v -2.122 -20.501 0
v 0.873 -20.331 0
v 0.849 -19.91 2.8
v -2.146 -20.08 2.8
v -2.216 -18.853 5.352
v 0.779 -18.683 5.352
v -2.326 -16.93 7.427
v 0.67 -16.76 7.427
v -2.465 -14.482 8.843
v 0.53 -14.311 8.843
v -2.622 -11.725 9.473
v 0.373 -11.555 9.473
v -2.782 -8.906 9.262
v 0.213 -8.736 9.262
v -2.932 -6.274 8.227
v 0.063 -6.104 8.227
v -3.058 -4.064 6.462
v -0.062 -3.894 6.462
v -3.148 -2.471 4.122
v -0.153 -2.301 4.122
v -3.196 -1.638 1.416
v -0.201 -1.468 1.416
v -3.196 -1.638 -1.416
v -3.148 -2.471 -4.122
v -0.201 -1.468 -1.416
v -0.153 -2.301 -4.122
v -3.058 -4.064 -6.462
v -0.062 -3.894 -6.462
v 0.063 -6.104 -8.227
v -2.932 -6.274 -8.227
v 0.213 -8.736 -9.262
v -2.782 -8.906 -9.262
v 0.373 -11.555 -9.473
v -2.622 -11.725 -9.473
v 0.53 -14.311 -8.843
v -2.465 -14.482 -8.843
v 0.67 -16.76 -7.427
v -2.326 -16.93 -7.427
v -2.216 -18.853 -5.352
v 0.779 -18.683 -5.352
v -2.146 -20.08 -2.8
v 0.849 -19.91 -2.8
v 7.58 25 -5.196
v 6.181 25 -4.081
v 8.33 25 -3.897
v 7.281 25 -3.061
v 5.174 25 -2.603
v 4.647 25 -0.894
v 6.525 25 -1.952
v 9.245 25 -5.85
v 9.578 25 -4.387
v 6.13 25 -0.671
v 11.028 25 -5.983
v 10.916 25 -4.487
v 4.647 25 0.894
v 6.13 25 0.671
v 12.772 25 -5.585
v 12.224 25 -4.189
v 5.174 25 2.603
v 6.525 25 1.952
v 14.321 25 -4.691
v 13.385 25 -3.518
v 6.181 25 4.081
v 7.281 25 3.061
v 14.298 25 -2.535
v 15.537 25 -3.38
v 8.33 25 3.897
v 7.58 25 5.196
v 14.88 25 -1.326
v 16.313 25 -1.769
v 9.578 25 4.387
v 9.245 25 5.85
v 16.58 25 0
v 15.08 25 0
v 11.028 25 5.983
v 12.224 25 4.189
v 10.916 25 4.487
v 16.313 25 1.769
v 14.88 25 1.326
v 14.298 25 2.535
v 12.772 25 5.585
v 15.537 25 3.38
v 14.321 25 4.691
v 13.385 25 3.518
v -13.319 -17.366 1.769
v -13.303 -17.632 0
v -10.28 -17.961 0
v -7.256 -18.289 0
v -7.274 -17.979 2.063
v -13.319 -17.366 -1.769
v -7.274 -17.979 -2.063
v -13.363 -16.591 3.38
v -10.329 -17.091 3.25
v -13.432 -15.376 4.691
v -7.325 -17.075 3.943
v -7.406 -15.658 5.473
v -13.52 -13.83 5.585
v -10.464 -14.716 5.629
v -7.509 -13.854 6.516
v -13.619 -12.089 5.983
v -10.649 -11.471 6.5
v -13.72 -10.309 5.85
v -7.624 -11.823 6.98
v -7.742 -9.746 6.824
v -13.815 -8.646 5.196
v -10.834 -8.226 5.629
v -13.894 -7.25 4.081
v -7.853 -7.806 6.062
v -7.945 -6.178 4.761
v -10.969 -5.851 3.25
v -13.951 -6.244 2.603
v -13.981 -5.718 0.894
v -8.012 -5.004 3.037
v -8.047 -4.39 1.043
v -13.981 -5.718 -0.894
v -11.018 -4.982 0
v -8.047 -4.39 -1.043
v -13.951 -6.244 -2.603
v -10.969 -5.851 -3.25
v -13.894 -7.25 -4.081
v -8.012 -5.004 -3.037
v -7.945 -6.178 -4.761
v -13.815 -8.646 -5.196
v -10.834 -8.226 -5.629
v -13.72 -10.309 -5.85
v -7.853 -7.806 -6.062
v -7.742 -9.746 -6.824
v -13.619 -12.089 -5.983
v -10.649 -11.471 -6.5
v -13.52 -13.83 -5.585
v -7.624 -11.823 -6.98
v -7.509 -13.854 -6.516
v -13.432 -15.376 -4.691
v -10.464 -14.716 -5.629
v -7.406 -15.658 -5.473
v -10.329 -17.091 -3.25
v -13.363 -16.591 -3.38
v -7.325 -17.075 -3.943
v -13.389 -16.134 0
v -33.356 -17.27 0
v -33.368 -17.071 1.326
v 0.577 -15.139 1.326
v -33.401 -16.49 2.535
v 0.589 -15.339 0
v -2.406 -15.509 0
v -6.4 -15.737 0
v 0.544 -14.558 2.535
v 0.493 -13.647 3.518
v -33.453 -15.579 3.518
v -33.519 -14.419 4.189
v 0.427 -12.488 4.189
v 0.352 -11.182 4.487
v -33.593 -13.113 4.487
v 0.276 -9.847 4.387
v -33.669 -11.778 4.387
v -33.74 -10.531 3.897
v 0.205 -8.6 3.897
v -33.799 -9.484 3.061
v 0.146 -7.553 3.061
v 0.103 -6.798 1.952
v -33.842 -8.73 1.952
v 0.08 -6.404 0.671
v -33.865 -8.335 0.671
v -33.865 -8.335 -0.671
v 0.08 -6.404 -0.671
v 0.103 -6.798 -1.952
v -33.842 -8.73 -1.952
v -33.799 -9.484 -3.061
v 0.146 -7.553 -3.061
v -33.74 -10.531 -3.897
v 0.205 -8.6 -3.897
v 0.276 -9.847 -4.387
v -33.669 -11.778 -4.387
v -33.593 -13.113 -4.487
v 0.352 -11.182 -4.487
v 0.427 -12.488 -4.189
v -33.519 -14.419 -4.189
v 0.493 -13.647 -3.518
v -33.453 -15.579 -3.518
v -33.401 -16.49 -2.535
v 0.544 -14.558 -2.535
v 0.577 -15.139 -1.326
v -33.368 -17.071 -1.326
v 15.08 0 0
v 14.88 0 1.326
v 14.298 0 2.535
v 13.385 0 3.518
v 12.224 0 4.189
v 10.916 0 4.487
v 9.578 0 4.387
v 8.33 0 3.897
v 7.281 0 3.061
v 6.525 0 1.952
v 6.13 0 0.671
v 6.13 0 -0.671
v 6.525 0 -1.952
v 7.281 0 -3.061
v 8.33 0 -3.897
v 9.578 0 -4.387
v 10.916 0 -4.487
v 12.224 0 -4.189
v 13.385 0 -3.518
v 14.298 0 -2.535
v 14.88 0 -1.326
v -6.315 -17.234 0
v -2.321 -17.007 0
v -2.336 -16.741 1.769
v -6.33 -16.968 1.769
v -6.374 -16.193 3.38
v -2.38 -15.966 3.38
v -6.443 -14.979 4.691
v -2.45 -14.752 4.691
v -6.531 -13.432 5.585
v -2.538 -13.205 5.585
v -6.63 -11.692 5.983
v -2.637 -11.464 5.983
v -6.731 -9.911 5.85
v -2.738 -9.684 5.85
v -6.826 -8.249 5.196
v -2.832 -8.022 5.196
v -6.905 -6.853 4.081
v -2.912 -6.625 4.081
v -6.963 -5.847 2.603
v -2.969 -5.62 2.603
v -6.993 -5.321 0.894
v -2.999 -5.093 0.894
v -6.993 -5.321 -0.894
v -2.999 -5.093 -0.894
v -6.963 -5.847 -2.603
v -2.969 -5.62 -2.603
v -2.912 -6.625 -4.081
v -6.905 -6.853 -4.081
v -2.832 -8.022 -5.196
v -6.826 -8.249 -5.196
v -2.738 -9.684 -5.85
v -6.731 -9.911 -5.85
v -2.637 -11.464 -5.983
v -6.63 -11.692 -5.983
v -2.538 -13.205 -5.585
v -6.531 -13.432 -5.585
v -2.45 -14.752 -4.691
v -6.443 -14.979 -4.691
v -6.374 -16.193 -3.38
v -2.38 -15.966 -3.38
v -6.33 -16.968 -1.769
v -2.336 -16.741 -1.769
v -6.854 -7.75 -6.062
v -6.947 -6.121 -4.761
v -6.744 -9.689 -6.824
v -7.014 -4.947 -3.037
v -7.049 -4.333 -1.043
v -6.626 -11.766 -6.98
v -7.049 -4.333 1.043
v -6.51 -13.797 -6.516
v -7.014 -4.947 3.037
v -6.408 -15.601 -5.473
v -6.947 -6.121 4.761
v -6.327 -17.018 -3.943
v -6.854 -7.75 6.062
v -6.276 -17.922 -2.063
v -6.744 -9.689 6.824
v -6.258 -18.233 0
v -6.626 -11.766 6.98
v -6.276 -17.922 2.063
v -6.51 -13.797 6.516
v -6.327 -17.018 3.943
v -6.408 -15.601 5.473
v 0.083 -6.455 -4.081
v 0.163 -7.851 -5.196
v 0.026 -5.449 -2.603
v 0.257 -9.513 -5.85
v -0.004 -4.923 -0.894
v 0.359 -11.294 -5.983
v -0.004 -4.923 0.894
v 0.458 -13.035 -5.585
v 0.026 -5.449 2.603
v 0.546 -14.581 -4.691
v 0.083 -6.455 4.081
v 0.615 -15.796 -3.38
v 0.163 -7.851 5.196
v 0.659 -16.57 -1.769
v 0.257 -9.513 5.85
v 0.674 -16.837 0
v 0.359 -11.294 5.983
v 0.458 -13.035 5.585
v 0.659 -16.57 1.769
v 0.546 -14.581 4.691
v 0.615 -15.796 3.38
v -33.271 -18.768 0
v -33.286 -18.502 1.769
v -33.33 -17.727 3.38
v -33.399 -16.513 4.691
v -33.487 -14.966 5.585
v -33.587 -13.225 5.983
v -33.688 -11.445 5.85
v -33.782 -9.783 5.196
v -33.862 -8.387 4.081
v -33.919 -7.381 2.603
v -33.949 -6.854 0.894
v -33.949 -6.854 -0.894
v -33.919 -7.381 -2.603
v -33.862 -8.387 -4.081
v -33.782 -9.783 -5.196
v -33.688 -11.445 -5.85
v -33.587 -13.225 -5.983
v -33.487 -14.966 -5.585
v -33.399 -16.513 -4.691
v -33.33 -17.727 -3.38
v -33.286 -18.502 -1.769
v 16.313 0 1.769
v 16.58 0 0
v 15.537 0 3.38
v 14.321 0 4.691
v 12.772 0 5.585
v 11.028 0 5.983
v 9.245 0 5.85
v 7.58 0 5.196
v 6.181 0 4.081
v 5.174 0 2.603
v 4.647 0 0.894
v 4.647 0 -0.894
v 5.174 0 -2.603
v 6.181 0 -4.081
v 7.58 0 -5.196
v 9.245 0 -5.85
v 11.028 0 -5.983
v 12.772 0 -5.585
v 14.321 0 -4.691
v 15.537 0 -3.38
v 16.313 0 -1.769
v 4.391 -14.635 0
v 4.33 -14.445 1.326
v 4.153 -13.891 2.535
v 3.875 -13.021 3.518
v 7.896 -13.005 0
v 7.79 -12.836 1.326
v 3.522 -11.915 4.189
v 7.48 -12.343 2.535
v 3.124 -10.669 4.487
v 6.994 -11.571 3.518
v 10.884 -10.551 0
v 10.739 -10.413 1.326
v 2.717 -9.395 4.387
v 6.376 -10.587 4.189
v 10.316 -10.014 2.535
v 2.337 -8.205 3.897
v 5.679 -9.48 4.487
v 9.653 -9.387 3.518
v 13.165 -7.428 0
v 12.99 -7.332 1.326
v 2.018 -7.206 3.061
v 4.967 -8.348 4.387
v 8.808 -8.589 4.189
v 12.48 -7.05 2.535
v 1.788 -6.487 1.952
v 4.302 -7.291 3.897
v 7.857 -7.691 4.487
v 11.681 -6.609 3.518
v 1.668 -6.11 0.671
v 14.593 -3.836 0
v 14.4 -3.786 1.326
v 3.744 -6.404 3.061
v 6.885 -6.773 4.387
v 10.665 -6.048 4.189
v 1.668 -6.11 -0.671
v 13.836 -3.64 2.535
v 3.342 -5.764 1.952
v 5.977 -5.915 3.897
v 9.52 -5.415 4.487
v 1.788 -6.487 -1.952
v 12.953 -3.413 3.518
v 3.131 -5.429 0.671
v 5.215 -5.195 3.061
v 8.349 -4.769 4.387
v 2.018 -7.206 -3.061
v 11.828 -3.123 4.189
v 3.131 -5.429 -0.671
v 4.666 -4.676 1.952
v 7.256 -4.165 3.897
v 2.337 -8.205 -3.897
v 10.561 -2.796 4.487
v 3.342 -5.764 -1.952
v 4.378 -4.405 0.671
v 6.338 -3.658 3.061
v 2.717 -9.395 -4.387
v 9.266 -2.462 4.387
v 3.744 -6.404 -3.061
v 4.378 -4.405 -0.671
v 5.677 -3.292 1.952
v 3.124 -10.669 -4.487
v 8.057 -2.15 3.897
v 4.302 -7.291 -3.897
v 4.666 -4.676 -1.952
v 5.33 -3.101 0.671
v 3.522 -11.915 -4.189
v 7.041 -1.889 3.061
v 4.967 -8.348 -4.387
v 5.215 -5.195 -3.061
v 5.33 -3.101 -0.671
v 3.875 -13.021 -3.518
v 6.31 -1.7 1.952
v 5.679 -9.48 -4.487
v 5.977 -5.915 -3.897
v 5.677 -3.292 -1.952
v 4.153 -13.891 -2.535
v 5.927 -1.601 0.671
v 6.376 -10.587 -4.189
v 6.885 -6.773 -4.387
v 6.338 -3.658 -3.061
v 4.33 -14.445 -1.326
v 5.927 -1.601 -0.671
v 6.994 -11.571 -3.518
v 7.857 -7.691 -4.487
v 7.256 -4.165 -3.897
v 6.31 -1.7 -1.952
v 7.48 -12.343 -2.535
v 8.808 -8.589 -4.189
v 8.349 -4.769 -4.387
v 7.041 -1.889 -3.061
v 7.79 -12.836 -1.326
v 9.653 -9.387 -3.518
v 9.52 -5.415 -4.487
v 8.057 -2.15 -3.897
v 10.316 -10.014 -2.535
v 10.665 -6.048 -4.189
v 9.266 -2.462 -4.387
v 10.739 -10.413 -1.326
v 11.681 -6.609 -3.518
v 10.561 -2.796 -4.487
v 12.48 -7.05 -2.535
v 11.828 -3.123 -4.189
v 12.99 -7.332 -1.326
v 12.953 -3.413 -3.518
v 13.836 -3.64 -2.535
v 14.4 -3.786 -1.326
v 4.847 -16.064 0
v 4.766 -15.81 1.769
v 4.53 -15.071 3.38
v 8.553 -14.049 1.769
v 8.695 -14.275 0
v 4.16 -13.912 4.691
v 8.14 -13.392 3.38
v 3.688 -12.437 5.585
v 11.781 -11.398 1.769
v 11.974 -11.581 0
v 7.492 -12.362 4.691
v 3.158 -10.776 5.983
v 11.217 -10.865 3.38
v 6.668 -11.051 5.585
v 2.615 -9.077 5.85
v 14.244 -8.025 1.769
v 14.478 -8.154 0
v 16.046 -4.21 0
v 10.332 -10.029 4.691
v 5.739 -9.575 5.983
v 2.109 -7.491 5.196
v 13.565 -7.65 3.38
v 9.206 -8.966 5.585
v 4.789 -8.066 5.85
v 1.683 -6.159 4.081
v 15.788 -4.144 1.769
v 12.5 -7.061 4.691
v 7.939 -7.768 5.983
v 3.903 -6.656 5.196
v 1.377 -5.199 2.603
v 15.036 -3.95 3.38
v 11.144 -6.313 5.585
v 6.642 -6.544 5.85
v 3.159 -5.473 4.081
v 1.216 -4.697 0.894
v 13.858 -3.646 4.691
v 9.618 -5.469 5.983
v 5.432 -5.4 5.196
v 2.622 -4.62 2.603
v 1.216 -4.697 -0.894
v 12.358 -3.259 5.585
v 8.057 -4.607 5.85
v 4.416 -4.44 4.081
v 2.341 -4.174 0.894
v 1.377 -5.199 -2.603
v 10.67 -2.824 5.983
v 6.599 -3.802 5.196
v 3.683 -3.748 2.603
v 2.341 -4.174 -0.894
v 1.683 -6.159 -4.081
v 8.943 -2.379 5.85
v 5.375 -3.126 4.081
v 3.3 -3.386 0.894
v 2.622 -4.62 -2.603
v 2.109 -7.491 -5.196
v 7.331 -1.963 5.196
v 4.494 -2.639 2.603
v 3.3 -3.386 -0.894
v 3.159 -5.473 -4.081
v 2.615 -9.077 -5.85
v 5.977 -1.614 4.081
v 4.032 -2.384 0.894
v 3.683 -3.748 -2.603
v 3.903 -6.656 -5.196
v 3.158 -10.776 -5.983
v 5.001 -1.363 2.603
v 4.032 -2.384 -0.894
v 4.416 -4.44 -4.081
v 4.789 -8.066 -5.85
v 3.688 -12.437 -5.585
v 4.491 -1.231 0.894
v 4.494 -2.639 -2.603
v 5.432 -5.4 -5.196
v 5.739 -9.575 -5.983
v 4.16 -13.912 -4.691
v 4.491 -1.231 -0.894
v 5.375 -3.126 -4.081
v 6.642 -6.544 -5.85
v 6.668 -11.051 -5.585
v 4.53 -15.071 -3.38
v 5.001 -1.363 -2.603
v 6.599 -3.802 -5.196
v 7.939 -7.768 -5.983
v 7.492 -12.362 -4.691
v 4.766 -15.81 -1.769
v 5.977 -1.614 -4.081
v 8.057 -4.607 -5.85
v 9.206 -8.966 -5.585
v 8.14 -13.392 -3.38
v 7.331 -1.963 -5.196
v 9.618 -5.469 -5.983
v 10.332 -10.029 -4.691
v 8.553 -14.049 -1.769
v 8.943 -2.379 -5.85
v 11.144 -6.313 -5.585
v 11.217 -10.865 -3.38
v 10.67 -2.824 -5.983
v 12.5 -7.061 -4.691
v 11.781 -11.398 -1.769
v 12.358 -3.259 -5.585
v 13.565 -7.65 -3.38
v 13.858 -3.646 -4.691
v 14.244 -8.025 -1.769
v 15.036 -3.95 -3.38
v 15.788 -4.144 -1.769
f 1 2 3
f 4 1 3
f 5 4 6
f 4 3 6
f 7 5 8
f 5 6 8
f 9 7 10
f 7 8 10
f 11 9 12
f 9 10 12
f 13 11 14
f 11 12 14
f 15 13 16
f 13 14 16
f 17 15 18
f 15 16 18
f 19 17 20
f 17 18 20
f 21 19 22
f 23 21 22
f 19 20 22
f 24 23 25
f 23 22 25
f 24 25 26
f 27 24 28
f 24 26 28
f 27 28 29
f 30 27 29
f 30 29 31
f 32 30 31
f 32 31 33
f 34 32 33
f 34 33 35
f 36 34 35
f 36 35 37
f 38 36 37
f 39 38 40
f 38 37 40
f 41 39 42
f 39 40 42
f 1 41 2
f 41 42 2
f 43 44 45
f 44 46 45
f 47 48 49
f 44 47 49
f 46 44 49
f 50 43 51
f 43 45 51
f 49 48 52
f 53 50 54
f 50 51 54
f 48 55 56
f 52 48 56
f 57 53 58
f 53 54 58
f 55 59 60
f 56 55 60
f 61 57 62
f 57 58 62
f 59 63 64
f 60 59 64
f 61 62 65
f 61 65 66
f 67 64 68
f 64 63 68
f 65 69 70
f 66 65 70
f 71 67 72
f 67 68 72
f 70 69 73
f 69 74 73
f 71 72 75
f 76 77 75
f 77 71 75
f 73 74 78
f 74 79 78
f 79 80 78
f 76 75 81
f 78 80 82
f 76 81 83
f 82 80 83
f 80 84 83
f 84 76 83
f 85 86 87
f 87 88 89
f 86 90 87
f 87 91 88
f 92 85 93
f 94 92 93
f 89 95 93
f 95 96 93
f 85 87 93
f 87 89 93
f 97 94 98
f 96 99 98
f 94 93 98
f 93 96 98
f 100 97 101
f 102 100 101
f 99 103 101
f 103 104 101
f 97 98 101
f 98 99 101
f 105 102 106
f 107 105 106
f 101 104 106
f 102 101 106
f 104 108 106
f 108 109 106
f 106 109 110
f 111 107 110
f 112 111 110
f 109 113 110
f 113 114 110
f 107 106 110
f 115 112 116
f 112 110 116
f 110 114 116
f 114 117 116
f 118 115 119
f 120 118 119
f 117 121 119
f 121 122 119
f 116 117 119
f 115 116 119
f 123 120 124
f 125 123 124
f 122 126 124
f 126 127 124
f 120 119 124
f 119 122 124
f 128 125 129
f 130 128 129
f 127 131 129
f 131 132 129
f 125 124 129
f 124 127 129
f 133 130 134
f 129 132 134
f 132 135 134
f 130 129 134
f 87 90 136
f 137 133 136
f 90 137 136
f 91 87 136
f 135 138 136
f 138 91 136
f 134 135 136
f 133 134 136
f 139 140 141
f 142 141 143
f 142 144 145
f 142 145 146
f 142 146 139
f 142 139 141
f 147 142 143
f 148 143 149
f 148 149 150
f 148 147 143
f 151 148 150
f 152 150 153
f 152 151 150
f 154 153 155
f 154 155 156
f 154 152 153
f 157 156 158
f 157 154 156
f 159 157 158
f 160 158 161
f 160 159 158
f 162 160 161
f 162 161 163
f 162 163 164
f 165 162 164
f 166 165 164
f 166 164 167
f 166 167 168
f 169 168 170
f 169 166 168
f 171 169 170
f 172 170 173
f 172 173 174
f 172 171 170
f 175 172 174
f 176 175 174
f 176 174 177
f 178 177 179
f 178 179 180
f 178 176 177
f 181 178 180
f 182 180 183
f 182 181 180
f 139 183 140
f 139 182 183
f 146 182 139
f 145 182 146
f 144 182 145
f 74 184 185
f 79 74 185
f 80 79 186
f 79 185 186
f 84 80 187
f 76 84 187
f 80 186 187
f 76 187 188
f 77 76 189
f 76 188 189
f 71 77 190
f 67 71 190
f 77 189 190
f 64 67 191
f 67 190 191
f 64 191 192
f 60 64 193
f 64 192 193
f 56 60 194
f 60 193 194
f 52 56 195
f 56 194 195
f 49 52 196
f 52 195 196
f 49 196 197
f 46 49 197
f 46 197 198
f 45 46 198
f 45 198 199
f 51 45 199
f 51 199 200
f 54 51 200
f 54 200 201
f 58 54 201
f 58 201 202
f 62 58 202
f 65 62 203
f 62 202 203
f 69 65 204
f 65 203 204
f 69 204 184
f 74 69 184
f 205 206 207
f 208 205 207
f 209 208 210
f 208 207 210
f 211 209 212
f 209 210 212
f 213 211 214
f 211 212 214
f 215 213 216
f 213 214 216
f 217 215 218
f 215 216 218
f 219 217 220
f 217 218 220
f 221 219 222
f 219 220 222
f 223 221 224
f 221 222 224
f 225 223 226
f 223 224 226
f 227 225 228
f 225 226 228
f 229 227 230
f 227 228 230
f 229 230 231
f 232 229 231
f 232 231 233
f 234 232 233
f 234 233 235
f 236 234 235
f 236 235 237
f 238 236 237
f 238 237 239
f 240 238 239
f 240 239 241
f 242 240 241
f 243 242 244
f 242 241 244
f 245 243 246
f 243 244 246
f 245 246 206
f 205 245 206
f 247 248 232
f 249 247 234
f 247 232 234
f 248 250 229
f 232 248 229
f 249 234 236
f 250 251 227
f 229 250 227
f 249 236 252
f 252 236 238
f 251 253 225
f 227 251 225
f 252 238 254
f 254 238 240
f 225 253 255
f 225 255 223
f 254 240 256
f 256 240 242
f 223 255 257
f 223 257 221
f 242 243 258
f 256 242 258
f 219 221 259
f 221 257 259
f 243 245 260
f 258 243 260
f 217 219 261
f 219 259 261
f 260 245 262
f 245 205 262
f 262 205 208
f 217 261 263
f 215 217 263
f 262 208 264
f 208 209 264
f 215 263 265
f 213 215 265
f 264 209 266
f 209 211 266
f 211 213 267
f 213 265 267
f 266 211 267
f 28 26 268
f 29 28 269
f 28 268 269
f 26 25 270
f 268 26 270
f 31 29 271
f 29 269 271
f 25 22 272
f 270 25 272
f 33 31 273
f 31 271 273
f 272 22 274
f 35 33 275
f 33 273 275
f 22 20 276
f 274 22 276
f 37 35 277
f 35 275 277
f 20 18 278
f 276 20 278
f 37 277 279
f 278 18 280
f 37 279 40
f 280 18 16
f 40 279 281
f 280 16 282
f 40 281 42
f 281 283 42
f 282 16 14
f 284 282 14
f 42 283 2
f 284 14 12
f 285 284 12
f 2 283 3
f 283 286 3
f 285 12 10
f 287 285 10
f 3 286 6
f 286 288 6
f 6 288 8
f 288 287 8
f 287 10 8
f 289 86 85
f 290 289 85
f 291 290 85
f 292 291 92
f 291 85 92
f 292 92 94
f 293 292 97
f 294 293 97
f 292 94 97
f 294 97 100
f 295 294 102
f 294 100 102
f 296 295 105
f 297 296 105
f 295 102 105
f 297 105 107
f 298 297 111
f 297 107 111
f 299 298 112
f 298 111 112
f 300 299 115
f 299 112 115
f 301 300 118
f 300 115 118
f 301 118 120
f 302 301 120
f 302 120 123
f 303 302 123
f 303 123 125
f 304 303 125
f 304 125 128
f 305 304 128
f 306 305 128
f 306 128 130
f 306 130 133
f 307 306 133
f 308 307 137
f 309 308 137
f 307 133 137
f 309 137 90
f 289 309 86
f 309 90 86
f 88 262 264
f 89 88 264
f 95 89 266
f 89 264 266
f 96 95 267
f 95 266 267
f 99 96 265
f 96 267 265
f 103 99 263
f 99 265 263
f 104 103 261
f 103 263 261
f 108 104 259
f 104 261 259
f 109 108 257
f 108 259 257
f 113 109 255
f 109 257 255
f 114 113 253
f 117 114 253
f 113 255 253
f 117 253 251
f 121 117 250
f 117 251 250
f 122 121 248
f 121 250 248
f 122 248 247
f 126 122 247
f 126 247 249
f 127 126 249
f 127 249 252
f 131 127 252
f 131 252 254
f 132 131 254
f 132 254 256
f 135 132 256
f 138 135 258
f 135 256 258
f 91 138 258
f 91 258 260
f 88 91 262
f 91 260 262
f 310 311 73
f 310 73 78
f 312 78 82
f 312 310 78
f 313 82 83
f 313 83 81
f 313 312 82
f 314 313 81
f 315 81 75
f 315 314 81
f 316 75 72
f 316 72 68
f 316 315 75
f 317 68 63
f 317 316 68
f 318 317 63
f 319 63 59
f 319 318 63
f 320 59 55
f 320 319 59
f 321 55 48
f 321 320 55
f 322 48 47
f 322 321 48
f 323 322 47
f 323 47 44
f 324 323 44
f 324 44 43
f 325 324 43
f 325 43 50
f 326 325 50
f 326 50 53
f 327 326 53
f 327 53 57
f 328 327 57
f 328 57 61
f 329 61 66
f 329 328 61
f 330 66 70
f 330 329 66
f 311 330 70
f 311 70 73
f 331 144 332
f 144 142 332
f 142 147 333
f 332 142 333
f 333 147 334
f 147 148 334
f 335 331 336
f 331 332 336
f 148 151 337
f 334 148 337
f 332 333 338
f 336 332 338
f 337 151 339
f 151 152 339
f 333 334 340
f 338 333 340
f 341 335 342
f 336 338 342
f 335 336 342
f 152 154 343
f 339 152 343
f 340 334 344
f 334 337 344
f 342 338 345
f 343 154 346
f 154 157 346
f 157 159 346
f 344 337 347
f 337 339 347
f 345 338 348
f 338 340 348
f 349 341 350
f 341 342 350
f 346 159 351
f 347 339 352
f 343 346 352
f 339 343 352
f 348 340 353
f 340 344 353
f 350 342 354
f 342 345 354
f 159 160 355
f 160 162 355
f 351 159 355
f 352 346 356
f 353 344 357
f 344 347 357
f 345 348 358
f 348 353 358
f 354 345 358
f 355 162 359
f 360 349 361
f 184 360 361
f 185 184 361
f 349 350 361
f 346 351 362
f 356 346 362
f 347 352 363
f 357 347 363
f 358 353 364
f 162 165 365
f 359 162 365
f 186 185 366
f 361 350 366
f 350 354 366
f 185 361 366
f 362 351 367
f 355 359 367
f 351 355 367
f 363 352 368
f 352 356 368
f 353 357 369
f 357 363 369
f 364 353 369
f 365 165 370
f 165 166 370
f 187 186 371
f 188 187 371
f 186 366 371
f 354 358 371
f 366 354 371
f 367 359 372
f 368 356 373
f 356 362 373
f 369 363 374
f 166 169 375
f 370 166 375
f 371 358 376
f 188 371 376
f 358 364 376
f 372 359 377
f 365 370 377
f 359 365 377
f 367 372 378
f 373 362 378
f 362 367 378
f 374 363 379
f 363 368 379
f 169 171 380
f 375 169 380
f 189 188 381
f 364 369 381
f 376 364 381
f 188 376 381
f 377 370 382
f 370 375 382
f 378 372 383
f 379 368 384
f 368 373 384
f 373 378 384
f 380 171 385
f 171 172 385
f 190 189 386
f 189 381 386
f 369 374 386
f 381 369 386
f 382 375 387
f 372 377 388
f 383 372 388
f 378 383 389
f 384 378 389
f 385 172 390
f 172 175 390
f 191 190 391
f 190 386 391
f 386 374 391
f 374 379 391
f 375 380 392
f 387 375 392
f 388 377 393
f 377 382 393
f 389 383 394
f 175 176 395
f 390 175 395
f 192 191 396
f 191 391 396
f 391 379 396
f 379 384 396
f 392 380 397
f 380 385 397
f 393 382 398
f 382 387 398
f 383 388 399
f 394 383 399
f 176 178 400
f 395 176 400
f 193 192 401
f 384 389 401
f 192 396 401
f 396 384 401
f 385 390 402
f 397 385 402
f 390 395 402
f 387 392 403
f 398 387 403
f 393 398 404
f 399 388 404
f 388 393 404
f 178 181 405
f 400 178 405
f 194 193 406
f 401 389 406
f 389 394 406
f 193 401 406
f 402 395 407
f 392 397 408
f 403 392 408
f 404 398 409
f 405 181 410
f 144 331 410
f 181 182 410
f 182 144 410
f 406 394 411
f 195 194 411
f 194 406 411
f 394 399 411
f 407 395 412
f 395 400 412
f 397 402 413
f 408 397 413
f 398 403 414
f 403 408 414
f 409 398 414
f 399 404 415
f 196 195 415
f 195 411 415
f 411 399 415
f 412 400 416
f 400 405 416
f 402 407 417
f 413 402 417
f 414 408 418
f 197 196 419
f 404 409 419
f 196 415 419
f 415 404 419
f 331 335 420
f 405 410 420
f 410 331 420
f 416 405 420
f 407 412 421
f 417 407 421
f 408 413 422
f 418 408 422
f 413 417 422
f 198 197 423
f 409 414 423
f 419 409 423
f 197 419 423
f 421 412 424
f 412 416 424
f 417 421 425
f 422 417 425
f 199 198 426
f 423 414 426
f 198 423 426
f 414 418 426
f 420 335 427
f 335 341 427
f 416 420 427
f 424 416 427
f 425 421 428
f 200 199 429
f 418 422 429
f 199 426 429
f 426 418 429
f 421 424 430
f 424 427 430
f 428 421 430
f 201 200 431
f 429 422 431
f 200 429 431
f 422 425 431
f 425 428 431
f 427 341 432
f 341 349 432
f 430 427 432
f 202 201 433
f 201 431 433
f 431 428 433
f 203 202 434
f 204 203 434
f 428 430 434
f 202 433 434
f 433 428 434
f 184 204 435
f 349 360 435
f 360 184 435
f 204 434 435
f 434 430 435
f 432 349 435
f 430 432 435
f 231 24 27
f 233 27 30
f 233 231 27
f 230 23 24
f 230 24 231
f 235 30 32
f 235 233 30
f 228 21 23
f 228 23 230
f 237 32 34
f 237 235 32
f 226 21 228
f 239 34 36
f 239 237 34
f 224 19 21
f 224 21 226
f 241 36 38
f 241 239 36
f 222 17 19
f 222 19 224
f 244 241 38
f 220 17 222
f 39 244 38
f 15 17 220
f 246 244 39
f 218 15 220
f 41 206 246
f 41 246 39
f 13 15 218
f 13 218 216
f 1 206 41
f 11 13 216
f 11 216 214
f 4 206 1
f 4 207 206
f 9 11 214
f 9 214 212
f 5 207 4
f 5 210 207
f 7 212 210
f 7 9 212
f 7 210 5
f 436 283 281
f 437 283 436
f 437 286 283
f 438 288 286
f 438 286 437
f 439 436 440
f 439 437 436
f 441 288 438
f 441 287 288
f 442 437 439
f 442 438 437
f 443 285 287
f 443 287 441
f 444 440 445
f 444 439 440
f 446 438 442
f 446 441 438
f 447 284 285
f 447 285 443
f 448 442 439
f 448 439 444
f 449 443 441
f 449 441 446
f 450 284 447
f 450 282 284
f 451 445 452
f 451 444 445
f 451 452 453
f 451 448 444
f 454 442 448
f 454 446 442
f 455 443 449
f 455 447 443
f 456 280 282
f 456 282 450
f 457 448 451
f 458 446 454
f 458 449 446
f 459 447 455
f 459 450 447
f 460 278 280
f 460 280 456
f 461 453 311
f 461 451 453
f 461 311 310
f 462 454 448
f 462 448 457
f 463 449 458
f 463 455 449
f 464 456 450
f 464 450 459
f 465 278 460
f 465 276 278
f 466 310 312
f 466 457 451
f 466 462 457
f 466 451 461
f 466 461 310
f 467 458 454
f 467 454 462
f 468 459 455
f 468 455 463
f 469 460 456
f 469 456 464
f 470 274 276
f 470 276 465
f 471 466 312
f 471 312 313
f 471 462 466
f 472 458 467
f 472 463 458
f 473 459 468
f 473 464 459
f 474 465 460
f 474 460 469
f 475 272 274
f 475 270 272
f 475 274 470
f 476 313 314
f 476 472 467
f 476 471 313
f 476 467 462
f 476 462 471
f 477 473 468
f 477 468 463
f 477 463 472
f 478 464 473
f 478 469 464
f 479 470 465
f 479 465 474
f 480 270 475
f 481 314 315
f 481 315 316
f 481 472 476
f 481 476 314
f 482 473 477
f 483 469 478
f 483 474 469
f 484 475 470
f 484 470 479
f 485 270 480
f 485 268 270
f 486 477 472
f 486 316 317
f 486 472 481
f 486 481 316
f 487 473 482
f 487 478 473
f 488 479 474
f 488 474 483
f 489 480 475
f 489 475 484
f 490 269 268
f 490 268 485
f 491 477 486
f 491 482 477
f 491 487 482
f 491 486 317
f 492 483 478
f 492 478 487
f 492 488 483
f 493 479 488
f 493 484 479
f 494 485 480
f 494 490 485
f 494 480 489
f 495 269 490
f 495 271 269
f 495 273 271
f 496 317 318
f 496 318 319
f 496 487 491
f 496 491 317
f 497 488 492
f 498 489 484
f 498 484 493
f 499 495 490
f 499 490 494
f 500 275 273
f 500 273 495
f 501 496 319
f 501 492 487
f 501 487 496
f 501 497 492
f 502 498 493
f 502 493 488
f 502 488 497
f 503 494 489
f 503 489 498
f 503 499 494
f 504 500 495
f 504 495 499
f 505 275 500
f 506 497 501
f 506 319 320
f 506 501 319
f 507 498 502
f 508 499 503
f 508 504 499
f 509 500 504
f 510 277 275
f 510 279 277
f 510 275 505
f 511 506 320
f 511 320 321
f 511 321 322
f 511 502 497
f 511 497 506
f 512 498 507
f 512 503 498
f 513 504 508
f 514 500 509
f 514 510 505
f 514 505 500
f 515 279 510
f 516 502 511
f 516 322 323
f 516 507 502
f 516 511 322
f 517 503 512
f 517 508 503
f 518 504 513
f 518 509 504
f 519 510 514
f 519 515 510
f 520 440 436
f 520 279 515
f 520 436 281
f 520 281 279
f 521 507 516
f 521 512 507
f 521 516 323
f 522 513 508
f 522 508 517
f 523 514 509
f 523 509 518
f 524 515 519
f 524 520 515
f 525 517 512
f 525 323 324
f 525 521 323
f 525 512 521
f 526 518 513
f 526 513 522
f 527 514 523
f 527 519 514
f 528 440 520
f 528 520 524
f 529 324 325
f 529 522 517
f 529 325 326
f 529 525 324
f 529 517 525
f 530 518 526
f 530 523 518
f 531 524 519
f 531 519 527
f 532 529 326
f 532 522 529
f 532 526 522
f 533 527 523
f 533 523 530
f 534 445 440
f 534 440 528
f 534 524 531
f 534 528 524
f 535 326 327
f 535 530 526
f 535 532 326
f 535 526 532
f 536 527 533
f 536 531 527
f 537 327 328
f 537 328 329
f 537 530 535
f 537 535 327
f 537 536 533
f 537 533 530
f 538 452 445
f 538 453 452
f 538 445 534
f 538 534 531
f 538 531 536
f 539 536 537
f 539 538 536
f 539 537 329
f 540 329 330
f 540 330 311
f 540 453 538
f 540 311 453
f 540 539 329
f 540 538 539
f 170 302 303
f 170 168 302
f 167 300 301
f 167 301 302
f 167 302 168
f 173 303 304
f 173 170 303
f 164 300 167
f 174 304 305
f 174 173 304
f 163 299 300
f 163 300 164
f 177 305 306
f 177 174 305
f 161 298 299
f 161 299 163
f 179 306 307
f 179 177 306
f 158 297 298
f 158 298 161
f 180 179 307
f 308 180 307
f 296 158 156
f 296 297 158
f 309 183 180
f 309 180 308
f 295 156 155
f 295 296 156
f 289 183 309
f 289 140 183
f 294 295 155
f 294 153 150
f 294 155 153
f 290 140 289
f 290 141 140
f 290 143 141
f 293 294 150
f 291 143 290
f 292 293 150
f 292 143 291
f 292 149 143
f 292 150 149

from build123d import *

# Parameters (mm, degrees)
F1_R        = 6
F1_R_2      = 4.5
F2_DEPTH    = 25
F2_FACE_R   = 6
F2_FACE_R_2 = 4.5
F4_R        = 9.5
F4_R_2      = 6
F4_R_3      = 4.5
F5_DEPTH    = 3
F6_R        = 6
F6_R_2      = 4.5
F7_DEPTH    = 4
F8_R        = 7
F8_R_2      = 6
F8_R_3      = 4.5
F9_DEPTH    = 7
F10_SIZE2   = 6
F10_SIZE    = 1
F11_R       = 6
F11_R_2     = 4.5
F12_DEPTH   = 20


with BuildPart() as f2:
    # F1 (on Front) → F2 (new body)
    with BuildSketch(Plane.XZ):
        with Locations((10.5797667056, 0)):
            Circle(F1_R)
        with Locations((10.5797667056, 0)):
            Circle(F1_R_2, mode=Mode.SUBTRACT)
    extrude(amount=-F2_DEPTH)

    # F3: sweep along a path in F0
    with BuildLine(Plane.XY) as f3_path:
        ThreePointArc((0, -4.9919255074), (3.3505289628, -3.4336417355), (4.7159582272, 0))
    # F2_face (on face) → F3 (sweep)
    with BuildSketch(Plane(origin=(10.5797667056, 0, 0), x_dir=(1, 0, 0), z_dir=(0, -1, 0))):
        Circle(F2_FACE_R)
        Circle(F2_FACE_R_2, mode=Mode.SUBTRACT)
    sweep(path=f3_path.line)

    # F4 (on face) → F5 (join)
    with BuildSketch(Plane(origin=(-0.2831251163, -0.0161098878, 0), x_dir=(0.0568083546, -0.9983851015, 0), z_dir=(-0.9983851015, -0.0568083546, 0))):
        with Locations((10.8476725327, 0)):
            Circle(F4_R)
        with Locations((10.8476725327, 0)):
            Circle(F4_R_2, mode=Mode.SUBTRACT)
        with Locations((10.8476725327, 0)):
            Circle(F4_R_2)
        with Locations((10.8476725327, 0)):
            Circle(F4_R_3, mode=Mode.SUBTRACT)
    extrude(amount=F5_DEPTH)

    # F6 (on face) → F7 (join)
    with BuildSketch(Plane(origin=(-3.2782804207, -0.1865349515, 0), x_dir=(0.0568083546, -0.9983851015, 0), z_dir=(-0.9983851015, -0.0568083546, 0))):
        with Locations((10.8476725327, 0)):
            Circle(F6_R)
        with Locations((10.8476725327, 0)):
            Circle(F6_R_2, mode=Mode.SUBTRACT)
    extrude(amount=F7_DEPTH)

    # F8 (on face) → F9 (join)
    with BuildSketch(Plane(origin=(-7.2718208266, -0.4137683698, 0), x_dir=(0.0568083546, -0.9983851015, 0), z_dir=(-0.9983851015, -0.0568083546, 0))):
        with Locations((10.8476725327, 0)):
            Circle(F8_R)
        with Locations((10.8476725327, 0)):
            Circle(F8_R_2, mode=Mode.SUBTRACT)
        with Locations((10.8476725327, 0)):
            Circle(F8_R_2)
        with Locations((10.8476725327, 0)):
            Circle(F8_R_3, mode=Mode.SUBTRACT)
    extrude(amount=F9_DEPTH)

    # F10
    f10_edges = [f2.edges().sort_by_distance(p)[0] for p in [
        (-14.041937, -4.652886, 0),
    ]]
    f10_side = f2.faces().sort_by_distance((-13.911163, -6.951178, 0))[0]
    chamfer(f10_edges, length=F10_SIZE, length2=F10_SIZE2, reference=f10_side)

    # F11 (on face) → F12 (join)
    with BuildSketch(Plane(origin=(-14.260516537, -0.8114268517, 0), x_dir=(0.0568083546, -0.9983851015, 0), z_dir=(-0.9983851015, -0.0568083546, 0))):
        with Locations((10.8476725327, 0)):
            Circle(F11_R)
        with Locations((10.8476725327, 0)):
            Circle(F11_R_2, mode=Mode.SUBTRACT)
    extrude(amount=F12_DEPTH)


solid = f2.part
